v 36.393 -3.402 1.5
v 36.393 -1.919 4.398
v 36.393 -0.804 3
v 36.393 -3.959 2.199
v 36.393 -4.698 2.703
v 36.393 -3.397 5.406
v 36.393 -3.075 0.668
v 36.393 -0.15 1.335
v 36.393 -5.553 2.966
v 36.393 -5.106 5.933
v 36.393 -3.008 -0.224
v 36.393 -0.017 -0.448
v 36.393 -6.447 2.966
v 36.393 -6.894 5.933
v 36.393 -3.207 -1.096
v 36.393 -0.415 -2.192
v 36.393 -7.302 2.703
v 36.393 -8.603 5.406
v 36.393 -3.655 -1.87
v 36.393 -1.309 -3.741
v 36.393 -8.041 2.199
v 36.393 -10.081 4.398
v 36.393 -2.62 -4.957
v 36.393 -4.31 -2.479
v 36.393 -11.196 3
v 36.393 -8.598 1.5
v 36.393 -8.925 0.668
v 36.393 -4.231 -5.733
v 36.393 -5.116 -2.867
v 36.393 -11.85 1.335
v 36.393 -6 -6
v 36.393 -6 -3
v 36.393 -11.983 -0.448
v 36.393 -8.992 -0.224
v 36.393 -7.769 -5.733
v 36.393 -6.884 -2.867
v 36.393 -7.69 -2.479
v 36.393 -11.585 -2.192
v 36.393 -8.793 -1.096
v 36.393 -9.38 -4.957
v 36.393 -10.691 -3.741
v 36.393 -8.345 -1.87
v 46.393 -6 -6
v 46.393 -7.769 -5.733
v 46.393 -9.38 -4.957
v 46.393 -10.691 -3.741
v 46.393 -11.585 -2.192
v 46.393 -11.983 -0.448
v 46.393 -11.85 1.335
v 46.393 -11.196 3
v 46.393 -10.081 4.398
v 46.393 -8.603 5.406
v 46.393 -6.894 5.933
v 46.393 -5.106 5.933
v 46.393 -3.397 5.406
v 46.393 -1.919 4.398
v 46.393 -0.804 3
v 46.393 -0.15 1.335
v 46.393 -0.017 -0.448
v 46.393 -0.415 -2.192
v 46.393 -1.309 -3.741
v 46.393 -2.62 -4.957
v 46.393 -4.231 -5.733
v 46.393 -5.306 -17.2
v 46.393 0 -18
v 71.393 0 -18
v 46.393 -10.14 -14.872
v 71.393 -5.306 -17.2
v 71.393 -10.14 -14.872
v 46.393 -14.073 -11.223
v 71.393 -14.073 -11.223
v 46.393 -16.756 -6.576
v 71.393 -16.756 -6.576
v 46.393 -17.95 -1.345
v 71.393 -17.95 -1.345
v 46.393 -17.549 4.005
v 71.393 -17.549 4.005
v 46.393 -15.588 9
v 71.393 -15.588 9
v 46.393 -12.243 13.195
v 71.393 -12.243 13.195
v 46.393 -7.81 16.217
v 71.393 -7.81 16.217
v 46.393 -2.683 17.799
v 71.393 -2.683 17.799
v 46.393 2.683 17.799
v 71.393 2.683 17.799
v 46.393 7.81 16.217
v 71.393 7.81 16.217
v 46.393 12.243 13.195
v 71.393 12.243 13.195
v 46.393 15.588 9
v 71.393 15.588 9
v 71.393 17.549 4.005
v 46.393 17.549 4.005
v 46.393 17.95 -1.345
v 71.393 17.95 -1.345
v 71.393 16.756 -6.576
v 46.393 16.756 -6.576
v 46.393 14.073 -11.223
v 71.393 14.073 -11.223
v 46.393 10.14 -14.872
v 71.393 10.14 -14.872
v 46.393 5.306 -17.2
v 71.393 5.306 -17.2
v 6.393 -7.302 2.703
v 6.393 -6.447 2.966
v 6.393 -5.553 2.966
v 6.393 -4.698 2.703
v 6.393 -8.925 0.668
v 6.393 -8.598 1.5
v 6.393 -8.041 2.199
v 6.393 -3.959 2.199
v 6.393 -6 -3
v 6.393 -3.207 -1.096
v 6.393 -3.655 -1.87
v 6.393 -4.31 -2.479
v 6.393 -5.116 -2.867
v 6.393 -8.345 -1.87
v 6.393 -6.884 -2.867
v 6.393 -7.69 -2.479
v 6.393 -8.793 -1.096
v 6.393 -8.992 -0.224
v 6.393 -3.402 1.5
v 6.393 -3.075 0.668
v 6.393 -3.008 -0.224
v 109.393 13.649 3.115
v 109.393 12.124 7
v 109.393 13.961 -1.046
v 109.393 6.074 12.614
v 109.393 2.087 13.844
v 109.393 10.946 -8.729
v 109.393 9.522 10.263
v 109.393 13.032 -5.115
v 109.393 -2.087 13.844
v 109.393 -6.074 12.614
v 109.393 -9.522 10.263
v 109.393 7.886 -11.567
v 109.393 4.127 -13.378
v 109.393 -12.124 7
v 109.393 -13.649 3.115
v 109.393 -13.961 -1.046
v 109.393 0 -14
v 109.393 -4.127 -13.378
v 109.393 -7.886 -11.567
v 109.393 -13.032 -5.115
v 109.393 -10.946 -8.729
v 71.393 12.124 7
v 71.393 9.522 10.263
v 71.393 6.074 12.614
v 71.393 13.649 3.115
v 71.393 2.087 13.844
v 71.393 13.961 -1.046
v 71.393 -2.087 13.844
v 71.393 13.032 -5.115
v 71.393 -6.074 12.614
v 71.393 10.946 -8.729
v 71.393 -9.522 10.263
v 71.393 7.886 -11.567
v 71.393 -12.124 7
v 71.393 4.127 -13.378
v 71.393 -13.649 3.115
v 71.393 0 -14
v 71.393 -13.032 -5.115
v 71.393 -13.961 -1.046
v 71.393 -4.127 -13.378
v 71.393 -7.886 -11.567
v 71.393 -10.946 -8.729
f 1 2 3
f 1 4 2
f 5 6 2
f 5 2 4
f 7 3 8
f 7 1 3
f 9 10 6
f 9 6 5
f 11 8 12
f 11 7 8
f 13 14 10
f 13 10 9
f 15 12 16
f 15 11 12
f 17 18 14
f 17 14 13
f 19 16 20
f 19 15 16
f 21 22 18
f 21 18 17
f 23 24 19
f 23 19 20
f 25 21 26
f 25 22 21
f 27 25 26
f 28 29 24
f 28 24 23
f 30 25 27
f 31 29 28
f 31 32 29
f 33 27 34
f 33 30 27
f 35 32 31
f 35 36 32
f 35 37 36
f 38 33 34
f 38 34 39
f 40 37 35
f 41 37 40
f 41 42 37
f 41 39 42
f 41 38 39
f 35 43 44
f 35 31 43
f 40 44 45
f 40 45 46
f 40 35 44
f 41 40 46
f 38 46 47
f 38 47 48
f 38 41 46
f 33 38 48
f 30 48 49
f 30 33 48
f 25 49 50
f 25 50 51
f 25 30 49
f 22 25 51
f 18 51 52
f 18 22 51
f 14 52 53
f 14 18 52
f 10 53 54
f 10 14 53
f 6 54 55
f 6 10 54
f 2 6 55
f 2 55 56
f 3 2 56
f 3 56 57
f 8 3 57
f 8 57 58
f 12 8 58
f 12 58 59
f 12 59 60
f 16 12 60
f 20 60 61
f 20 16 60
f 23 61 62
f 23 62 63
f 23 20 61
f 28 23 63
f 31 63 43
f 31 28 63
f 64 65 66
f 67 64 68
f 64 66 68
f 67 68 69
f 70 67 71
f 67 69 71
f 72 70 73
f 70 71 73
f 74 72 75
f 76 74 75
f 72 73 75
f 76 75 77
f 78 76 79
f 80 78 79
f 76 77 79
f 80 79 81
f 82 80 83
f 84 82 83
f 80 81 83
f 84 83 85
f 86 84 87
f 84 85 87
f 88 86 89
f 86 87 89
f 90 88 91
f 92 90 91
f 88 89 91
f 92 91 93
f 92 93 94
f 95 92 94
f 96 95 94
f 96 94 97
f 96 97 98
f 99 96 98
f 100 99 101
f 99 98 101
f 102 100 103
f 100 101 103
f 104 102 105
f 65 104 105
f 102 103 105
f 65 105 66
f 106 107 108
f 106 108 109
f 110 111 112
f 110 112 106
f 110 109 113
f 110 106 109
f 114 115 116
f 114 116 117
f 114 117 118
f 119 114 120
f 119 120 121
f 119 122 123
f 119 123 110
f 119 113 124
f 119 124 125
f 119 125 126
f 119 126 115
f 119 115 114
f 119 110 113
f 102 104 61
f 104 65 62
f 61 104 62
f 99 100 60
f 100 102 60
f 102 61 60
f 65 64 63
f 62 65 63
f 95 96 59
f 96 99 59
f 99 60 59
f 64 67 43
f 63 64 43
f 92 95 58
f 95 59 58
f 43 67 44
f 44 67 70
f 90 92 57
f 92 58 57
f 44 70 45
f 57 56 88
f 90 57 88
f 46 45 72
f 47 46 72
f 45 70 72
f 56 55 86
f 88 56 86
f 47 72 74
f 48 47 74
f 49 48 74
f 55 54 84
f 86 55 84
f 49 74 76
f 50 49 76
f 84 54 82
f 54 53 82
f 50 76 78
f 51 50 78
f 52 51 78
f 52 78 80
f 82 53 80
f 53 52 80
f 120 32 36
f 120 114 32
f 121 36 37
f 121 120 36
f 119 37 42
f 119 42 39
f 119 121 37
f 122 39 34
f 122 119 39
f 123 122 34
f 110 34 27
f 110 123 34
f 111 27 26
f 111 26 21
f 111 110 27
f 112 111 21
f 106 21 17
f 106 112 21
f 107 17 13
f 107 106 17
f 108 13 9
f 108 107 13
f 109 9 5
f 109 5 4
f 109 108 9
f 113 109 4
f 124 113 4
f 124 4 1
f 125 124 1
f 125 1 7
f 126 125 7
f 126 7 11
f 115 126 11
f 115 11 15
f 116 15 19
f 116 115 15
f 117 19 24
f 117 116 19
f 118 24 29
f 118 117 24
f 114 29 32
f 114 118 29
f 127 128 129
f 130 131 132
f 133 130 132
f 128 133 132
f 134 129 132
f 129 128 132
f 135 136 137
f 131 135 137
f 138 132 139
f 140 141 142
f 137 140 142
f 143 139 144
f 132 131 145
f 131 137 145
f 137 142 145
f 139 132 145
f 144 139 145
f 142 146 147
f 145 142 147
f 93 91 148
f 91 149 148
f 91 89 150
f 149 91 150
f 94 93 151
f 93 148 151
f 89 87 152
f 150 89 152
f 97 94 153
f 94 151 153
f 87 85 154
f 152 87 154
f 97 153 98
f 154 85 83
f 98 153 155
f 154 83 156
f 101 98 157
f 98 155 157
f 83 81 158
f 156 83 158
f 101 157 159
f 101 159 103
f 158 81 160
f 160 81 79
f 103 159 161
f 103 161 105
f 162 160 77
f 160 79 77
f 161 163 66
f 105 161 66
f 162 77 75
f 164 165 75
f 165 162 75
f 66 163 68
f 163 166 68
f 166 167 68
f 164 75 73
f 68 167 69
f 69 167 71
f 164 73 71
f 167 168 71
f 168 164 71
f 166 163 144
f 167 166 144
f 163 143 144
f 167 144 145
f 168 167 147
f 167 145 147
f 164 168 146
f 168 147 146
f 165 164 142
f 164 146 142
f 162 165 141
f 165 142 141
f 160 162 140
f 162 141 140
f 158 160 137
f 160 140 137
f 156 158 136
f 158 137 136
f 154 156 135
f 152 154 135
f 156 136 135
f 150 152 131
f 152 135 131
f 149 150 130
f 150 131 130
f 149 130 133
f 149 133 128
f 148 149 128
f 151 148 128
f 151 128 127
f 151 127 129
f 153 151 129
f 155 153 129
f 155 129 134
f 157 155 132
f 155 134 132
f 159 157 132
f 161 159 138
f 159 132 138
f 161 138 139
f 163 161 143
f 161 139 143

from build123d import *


with BuildPart() as part:
    # Sketch2 → Revolve2 (revolve)
    with BuildSketch(Plane.XY, mode=Mode.PRIVATE) as revolve2_sk:
        Polygon((46.393095281, 0), (46.393095281, 18), (71.393095281, 18), (71.393095281, 14), (109.393095281, 14), (109.393095281, 0), align=None)
    revolve(revolve2_sk.sketch.rotate(Axis((109.393095281, 0, 0), (-1, 0, 0)), 90), axis=Axis((109.393095281, 0, 0), (-1, 0, 0)))

    # Sketch13 → Revolve3 (revolve)
    with BuildSketch(Plane.XY, mode=Mode.PRIVATE) as revolve3_sk:
        Polygon((46.393095281, -6), (46.393095281, 0), (36.393095281, 0), (36.393095281, -3), (6.393095281, -3), (6.393095281, -6), align=None)
    revolve(revolve3_sk.sketch.rotate(Axis((46.393095281, -6, 0), (-1, 0, 0)), 90), axis=Axis((46.393095281, -6, 0), (-1, 0, 0)))


solid = part.part
